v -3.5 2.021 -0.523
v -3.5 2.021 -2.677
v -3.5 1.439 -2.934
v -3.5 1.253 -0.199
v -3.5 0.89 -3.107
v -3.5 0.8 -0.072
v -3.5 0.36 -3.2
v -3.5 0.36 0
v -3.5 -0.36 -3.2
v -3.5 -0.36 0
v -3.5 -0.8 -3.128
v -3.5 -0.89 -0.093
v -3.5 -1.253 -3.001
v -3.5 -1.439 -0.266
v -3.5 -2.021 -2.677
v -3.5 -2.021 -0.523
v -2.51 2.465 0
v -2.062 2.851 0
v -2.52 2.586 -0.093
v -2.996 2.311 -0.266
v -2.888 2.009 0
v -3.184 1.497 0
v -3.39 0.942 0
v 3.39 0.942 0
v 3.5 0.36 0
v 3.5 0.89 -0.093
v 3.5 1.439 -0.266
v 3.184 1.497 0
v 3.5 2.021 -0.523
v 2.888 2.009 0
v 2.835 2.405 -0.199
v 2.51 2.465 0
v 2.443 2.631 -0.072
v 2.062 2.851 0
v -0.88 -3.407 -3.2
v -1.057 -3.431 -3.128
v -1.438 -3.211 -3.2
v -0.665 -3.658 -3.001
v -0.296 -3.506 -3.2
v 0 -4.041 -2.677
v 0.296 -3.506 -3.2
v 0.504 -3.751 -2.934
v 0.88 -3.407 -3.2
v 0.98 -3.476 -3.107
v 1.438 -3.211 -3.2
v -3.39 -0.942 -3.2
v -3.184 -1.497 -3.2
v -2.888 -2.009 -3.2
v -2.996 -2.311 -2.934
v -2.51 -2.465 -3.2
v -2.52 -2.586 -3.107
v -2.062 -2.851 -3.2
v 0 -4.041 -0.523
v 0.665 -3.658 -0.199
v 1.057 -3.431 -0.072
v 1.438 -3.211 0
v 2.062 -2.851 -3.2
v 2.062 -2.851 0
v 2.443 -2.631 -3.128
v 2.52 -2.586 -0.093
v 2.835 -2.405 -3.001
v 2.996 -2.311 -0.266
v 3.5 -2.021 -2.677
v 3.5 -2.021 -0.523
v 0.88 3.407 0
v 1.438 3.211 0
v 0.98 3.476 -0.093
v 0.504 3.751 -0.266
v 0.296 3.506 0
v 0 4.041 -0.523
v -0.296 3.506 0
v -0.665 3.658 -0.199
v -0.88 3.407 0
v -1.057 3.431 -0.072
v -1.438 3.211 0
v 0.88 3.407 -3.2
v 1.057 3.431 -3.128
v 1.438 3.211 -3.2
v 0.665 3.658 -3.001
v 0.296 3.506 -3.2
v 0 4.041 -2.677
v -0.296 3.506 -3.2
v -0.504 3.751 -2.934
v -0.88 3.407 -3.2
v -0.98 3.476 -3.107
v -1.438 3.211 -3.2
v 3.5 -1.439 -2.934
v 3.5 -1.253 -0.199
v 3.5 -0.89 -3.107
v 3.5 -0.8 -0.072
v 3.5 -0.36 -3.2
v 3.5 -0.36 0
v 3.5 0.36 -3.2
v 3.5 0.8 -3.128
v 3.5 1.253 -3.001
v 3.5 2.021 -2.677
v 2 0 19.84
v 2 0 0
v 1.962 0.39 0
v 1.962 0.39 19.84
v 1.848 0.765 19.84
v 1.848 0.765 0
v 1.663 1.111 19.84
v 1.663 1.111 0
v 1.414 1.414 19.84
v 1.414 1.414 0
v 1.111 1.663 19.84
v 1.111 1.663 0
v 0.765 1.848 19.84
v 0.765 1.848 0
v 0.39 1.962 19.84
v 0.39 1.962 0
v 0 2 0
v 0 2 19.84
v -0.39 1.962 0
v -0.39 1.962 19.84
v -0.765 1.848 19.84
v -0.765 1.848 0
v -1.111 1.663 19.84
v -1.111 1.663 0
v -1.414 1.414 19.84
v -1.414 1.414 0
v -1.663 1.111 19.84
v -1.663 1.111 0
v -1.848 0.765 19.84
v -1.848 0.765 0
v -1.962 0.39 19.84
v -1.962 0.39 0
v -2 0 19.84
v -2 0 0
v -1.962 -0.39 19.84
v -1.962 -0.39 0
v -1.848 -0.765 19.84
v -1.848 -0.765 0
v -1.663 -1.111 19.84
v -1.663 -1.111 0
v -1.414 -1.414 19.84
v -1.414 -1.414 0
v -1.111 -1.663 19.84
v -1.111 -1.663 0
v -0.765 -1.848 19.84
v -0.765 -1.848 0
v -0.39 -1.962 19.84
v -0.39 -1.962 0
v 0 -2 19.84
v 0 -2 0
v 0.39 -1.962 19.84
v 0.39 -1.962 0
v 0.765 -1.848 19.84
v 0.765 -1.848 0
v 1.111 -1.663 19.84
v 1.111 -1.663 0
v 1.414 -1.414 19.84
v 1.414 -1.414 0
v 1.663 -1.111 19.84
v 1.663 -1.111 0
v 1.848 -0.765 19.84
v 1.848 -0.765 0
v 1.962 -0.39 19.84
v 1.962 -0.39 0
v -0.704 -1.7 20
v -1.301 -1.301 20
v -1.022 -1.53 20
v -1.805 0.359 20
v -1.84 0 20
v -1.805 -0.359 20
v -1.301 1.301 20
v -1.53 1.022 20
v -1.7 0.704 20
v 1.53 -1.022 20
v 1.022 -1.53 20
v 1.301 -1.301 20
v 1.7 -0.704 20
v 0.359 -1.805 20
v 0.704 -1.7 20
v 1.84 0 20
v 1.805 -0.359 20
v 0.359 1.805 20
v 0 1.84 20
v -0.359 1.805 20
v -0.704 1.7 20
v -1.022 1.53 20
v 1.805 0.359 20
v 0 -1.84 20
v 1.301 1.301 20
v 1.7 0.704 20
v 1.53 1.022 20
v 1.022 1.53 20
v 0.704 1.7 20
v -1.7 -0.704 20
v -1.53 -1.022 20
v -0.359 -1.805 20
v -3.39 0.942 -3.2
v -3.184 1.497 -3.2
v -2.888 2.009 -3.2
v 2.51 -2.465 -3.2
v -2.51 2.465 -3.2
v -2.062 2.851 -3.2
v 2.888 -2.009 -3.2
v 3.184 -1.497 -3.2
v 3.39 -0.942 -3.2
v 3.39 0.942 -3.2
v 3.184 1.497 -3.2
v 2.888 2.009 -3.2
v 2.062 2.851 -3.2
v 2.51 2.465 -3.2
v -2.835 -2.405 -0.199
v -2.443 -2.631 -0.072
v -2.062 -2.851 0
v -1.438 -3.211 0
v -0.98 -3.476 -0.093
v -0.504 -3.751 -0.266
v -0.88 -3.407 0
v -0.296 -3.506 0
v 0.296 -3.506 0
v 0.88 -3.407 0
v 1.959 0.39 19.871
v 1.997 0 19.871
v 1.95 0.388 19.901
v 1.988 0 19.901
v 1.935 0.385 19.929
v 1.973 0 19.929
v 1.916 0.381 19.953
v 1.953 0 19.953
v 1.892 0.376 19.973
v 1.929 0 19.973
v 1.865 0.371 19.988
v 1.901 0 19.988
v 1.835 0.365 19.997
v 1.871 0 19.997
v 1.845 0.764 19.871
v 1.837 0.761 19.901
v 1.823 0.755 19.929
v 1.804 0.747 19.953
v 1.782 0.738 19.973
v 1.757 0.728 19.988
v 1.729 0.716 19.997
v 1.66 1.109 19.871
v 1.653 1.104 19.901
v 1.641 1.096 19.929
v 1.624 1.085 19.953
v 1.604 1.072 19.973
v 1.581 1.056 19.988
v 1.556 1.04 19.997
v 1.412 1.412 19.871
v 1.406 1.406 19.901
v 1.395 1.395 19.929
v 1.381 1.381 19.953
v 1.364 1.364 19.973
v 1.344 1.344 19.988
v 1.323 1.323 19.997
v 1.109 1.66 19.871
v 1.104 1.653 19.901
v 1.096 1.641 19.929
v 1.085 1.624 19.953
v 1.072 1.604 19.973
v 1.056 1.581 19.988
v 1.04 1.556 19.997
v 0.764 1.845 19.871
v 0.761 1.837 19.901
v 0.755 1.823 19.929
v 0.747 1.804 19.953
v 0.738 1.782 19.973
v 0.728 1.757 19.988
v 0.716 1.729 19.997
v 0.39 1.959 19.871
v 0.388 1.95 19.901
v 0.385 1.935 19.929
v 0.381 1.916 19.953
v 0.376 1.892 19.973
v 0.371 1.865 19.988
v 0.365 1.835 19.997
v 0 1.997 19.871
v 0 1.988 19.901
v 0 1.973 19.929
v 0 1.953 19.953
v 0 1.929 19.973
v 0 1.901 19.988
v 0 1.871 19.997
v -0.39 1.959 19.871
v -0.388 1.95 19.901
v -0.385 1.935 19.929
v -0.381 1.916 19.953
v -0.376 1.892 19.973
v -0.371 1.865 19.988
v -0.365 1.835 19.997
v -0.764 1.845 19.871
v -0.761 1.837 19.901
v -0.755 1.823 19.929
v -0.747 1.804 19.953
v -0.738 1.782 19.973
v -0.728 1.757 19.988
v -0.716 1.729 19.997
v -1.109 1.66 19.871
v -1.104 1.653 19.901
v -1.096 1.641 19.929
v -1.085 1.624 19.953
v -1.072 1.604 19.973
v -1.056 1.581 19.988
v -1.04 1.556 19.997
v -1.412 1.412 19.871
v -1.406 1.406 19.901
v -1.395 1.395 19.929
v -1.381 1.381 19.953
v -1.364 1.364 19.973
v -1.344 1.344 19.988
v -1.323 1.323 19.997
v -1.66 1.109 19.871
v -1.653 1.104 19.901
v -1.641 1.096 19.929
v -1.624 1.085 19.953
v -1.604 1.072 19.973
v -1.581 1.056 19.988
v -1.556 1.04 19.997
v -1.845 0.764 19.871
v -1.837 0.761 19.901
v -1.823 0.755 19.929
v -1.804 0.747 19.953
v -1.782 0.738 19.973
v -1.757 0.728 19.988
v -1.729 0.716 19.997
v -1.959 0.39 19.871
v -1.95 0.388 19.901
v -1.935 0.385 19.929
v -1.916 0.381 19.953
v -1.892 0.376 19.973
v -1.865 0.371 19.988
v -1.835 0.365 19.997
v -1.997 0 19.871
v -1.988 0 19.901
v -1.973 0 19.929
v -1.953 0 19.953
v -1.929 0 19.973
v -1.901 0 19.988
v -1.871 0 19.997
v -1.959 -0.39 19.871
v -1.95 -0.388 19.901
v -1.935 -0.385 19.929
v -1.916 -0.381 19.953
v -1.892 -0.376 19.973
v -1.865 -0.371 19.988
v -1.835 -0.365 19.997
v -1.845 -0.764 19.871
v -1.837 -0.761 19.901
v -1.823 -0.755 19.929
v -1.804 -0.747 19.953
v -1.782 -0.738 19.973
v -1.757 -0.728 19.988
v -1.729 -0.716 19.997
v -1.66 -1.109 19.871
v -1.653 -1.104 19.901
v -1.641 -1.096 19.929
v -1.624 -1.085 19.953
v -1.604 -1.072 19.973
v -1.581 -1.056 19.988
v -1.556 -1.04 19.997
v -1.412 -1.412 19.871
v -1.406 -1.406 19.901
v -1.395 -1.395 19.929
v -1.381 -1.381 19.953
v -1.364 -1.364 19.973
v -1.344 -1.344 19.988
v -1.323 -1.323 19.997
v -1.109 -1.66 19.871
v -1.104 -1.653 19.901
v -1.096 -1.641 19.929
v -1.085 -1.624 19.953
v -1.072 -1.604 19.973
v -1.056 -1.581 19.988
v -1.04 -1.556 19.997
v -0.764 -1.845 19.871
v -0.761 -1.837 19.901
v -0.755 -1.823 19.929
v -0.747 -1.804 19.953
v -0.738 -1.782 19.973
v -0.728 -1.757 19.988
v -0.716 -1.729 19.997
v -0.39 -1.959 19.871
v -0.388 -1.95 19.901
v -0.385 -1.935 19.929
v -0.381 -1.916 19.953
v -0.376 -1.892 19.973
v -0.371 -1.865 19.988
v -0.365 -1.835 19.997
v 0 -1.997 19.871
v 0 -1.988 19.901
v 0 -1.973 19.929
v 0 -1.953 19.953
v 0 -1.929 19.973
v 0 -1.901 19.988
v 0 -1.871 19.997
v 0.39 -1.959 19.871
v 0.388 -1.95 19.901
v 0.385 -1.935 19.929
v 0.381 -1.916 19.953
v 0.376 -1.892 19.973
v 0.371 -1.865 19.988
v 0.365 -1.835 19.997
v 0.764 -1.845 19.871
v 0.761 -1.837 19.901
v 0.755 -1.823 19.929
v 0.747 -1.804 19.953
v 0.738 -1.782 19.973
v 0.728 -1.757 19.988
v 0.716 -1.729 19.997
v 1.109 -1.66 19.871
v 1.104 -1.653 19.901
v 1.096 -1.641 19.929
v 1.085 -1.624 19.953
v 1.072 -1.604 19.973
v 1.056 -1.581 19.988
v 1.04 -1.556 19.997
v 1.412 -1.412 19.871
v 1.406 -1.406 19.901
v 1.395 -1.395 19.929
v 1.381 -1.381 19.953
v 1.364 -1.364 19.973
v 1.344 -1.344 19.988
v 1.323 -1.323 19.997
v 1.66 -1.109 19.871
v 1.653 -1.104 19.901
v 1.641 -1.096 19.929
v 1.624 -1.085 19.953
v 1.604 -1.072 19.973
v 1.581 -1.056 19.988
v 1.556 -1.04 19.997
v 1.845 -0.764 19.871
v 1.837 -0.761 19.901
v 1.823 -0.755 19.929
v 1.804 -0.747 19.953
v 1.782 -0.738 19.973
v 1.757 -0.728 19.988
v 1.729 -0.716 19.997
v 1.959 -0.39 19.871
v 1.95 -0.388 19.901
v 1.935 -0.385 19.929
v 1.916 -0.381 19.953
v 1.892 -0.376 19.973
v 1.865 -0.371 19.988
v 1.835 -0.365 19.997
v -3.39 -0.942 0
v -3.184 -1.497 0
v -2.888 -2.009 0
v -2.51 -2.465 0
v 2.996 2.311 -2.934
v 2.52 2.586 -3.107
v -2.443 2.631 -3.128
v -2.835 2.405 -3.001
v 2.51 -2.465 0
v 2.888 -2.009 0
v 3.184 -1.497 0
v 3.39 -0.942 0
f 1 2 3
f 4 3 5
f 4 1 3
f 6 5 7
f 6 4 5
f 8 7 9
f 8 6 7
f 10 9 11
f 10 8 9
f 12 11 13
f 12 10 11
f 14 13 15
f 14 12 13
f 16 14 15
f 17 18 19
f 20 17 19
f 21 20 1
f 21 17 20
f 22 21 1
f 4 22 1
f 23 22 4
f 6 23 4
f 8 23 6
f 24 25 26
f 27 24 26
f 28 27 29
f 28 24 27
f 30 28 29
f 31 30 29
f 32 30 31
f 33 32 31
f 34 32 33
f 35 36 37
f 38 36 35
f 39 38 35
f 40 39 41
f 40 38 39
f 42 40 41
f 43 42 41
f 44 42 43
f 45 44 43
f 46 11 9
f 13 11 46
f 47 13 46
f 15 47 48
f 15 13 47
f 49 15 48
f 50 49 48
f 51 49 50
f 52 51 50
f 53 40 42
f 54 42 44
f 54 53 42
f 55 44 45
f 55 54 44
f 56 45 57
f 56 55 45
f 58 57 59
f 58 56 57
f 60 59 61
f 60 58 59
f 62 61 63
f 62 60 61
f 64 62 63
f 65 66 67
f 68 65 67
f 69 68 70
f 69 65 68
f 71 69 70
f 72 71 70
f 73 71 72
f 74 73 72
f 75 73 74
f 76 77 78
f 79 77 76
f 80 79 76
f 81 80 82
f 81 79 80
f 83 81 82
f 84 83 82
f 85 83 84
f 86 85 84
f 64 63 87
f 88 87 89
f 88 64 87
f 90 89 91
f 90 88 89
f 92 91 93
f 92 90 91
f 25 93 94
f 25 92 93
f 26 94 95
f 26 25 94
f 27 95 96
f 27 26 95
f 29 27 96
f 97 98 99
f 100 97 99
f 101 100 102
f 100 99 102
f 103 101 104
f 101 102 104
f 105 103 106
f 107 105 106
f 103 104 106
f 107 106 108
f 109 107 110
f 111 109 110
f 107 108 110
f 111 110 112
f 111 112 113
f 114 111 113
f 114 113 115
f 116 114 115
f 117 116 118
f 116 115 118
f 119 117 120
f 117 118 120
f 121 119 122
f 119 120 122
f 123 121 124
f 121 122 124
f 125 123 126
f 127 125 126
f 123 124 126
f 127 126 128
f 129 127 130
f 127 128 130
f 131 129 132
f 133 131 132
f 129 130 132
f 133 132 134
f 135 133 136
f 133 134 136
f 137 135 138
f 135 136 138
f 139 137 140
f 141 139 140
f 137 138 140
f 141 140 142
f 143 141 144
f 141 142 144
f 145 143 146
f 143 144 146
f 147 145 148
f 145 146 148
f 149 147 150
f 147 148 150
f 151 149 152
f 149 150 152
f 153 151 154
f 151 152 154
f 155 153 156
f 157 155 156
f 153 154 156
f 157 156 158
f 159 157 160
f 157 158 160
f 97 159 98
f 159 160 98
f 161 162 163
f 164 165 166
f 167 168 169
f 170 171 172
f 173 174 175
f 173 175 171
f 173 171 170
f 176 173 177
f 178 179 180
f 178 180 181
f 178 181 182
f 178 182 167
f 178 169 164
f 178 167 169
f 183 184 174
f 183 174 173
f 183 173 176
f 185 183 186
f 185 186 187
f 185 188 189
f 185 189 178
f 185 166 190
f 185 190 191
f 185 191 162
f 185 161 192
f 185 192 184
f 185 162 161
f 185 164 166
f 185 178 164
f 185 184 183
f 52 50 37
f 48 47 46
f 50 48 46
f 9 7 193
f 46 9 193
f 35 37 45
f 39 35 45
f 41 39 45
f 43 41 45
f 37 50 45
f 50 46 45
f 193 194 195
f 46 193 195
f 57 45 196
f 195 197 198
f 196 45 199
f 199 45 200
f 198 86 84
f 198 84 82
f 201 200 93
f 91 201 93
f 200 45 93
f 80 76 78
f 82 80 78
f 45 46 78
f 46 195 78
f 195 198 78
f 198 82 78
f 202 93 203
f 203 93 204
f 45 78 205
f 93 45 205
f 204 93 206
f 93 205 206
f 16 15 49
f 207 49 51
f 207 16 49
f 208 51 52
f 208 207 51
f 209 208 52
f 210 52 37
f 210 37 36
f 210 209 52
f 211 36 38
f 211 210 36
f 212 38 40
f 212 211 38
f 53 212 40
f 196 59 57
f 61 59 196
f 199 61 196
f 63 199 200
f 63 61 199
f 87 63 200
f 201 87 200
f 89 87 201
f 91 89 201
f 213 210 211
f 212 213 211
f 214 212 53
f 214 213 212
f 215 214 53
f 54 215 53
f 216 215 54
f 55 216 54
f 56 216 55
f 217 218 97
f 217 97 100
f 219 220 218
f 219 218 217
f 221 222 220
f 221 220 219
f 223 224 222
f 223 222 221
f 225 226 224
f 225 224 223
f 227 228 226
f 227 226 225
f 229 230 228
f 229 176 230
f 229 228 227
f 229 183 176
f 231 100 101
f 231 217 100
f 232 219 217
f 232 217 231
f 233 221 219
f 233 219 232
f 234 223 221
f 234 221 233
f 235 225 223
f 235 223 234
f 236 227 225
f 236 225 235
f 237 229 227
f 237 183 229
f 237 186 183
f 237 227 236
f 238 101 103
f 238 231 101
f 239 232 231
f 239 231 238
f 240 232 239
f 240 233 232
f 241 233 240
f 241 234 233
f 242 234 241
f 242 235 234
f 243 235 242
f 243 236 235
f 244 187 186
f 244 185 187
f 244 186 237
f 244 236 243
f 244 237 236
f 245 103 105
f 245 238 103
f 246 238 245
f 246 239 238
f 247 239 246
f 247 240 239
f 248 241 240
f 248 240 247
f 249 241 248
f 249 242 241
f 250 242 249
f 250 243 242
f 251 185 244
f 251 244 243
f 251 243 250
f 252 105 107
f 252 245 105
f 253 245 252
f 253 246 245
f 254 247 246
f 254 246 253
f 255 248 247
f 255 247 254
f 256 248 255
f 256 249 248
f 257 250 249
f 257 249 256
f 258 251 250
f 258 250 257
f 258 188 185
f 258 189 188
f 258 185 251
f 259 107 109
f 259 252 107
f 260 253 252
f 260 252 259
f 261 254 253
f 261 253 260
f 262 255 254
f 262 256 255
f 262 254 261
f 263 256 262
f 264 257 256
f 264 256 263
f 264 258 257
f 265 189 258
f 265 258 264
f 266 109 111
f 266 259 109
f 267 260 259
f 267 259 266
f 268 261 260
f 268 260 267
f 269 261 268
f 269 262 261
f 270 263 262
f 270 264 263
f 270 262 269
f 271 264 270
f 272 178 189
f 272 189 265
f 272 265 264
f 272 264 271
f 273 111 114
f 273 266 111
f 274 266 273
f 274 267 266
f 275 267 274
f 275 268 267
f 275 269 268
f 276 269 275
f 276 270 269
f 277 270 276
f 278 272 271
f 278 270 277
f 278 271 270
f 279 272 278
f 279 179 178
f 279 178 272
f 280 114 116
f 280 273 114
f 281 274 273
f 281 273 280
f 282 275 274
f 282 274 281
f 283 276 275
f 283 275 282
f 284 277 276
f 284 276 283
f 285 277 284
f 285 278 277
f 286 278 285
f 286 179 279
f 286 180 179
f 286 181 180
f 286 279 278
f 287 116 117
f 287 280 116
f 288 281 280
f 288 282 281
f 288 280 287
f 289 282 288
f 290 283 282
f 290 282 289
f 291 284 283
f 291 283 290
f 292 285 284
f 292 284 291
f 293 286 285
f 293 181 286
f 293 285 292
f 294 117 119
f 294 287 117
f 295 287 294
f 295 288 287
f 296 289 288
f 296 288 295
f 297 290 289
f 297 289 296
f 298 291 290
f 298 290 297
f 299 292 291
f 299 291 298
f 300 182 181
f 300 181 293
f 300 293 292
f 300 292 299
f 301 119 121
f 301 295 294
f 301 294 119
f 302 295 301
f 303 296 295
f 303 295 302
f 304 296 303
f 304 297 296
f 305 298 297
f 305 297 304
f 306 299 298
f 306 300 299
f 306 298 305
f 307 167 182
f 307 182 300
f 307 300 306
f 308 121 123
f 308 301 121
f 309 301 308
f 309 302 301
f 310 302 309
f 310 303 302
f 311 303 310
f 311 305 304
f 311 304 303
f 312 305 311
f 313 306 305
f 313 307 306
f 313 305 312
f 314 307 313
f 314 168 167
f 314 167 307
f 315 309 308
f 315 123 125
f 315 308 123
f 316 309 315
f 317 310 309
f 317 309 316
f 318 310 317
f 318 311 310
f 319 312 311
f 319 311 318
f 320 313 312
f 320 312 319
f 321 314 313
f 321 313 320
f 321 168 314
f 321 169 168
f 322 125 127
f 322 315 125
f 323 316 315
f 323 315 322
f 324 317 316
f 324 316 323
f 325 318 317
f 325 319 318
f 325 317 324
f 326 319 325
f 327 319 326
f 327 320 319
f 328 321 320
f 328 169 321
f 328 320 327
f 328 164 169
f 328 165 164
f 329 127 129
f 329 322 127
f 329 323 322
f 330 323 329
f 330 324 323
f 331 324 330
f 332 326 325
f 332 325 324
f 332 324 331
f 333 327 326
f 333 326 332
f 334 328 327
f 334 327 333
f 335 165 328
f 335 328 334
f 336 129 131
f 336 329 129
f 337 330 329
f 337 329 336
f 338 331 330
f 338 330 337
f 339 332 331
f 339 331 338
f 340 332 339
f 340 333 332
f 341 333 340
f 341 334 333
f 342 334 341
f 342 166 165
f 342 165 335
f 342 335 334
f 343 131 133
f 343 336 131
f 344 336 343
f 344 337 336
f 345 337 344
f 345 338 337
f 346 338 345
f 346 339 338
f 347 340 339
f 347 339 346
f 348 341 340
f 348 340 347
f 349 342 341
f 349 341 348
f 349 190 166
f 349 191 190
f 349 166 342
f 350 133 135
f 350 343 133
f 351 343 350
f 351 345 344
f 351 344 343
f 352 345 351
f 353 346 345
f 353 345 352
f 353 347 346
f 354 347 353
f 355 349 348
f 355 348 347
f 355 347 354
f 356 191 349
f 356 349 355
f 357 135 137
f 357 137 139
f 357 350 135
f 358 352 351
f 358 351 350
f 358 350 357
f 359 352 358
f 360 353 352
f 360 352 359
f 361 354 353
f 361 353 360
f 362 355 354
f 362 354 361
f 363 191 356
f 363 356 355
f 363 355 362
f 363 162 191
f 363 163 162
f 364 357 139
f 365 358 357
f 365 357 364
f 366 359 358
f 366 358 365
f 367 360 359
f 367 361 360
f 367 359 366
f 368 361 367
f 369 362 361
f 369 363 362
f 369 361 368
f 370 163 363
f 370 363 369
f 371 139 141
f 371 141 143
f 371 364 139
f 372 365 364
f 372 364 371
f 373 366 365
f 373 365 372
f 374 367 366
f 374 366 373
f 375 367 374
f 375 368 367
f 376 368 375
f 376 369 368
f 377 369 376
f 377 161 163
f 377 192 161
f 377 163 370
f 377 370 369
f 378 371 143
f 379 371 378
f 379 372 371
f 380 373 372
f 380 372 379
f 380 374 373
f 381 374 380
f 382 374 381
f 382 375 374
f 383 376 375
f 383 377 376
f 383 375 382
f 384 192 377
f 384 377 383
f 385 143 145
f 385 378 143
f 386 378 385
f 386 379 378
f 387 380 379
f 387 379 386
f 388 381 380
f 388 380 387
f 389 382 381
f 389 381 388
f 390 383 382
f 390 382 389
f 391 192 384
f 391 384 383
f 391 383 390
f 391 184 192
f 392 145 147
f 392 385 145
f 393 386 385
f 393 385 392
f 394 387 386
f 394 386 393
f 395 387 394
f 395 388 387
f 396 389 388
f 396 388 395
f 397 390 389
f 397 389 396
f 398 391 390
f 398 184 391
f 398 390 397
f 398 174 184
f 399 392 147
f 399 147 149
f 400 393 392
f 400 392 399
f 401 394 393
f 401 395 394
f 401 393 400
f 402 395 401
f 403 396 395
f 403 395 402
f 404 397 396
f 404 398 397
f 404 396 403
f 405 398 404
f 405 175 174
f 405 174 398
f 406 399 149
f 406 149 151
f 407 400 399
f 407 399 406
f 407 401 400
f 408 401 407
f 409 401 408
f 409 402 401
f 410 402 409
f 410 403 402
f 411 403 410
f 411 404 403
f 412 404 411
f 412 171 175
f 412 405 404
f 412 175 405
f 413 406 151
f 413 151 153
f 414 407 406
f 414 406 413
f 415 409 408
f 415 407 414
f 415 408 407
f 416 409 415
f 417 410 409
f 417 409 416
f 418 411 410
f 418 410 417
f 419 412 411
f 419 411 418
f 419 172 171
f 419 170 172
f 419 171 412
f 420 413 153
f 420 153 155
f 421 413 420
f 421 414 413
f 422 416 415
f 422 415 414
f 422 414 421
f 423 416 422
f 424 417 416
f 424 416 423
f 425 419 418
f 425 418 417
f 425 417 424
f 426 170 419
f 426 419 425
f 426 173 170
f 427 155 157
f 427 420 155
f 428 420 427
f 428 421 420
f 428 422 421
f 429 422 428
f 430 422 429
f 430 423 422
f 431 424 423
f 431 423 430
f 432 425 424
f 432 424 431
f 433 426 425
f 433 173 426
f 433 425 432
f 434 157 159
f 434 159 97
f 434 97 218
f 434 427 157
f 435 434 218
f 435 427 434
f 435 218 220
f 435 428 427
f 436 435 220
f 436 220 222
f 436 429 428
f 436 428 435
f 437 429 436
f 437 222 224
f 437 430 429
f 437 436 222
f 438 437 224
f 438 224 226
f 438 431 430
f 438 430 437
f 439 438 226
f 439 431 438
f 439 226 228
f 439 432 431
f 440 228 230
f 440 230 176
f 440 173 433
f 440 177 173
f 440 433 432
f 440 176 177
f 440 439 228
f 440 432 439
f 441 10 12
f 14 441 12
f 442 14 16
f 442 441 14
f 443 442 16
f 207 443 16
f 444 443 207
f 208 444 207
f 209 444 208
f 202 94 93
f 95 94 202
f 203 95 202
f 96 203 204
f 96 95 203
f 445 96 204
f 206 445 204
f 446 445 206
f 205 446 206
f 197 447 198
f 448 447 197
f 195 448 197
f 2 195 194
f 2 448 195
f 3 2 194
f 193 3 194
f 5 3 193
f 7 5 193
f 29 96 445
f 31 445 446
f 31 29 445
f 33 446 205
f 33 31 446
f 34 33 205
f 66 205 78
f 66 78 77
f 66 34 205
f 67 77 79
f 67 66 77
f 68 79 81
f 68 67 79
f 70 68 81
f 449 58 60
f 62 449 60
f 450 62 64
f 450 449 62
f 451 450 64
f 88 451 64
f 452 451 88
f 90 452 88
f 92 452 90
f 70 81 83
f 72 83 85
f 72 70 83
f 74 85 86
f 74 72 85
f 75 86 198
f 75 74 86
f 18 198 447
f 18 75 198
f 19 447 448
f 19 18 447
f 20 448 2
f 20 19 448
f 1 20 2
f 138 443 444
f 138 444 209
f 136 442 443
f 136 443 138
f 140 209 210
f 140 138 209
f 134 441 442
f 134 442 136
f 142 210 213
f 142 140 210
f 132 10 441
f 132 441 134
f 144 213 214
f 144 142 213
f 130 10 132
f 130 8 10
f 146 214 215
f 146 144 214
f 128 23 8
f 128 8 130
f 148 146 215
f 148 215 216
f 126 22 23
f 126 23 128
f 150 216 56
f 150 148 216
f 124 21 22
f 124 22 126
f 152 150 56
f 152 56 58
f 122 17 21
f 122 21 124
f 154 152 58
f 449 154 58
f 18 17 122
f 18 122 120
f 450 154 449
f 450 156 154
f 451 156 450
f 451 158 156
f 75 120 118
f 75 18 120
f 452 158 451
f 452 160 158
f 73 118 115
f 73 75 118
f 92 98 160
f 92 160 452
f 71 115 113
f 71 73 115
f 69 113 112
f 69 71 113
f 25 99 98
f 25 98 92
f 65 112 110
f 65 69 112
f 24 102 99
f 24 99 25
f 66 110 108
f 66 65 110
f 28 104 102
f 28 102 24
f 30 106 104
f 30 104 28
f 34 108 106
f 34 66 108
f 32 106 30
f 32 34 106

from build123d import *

# Parameters (mm, degrees)
EXTRUDE_1_DEPTH = 3.2
SKETCH_2_R      = 2
EXTRUDE_2_DEPTH = 20
FILLET_1_R      = 0.16


with BuildPart() as part:
    # 草图1 → 凸台-拉伸1 (new body)
    with BuildSketch(Plane.XY):
        Polygon((0, 4.041451884), (-3.5, 2.020725942), (-3.5, -2.020725942), (0, -4.041451884), (3.5, -2.020725942), (3.5, 2.020725942), align=None)
    extrude(amount=-EXTRUDE_1_DEPTH)

    # 草图2 → 凸台-拉伸2 (add)
    with BuildSketch(Plane.XY):
        Circle(SKETCH_2_R)
    extrude(amount=EXTRUDE_2_DEPTH)

    # 圆角1
    fillet_1_edges = [part.edges().sort_by_distance(p)[0] for p in [
        (-2, 0, 20),
    ]]
    fillet(fillet_1_edges, radius=FILLET_1_R)

    # 草图3 → 切除-旋转1 (revolve, cut)
    with BuildSketch(Plane(origin=(0, 0, 0), x_dir=(0, 0, -1), z_dir=(1, 0, 0))):
        Polygon((0.523, 4.041451884), (0, 3.518451884), (0, 4.041451884), align=None)
        Polygon((3.2, 4.041451884), (3.2, 3.518451884), (2.677, 4.041451884), align=None)
    revolve(axis=Axis((0, 0, 0), (0, 0, 1)), mode=Mode.SUBTRACT)


solid = part.part
